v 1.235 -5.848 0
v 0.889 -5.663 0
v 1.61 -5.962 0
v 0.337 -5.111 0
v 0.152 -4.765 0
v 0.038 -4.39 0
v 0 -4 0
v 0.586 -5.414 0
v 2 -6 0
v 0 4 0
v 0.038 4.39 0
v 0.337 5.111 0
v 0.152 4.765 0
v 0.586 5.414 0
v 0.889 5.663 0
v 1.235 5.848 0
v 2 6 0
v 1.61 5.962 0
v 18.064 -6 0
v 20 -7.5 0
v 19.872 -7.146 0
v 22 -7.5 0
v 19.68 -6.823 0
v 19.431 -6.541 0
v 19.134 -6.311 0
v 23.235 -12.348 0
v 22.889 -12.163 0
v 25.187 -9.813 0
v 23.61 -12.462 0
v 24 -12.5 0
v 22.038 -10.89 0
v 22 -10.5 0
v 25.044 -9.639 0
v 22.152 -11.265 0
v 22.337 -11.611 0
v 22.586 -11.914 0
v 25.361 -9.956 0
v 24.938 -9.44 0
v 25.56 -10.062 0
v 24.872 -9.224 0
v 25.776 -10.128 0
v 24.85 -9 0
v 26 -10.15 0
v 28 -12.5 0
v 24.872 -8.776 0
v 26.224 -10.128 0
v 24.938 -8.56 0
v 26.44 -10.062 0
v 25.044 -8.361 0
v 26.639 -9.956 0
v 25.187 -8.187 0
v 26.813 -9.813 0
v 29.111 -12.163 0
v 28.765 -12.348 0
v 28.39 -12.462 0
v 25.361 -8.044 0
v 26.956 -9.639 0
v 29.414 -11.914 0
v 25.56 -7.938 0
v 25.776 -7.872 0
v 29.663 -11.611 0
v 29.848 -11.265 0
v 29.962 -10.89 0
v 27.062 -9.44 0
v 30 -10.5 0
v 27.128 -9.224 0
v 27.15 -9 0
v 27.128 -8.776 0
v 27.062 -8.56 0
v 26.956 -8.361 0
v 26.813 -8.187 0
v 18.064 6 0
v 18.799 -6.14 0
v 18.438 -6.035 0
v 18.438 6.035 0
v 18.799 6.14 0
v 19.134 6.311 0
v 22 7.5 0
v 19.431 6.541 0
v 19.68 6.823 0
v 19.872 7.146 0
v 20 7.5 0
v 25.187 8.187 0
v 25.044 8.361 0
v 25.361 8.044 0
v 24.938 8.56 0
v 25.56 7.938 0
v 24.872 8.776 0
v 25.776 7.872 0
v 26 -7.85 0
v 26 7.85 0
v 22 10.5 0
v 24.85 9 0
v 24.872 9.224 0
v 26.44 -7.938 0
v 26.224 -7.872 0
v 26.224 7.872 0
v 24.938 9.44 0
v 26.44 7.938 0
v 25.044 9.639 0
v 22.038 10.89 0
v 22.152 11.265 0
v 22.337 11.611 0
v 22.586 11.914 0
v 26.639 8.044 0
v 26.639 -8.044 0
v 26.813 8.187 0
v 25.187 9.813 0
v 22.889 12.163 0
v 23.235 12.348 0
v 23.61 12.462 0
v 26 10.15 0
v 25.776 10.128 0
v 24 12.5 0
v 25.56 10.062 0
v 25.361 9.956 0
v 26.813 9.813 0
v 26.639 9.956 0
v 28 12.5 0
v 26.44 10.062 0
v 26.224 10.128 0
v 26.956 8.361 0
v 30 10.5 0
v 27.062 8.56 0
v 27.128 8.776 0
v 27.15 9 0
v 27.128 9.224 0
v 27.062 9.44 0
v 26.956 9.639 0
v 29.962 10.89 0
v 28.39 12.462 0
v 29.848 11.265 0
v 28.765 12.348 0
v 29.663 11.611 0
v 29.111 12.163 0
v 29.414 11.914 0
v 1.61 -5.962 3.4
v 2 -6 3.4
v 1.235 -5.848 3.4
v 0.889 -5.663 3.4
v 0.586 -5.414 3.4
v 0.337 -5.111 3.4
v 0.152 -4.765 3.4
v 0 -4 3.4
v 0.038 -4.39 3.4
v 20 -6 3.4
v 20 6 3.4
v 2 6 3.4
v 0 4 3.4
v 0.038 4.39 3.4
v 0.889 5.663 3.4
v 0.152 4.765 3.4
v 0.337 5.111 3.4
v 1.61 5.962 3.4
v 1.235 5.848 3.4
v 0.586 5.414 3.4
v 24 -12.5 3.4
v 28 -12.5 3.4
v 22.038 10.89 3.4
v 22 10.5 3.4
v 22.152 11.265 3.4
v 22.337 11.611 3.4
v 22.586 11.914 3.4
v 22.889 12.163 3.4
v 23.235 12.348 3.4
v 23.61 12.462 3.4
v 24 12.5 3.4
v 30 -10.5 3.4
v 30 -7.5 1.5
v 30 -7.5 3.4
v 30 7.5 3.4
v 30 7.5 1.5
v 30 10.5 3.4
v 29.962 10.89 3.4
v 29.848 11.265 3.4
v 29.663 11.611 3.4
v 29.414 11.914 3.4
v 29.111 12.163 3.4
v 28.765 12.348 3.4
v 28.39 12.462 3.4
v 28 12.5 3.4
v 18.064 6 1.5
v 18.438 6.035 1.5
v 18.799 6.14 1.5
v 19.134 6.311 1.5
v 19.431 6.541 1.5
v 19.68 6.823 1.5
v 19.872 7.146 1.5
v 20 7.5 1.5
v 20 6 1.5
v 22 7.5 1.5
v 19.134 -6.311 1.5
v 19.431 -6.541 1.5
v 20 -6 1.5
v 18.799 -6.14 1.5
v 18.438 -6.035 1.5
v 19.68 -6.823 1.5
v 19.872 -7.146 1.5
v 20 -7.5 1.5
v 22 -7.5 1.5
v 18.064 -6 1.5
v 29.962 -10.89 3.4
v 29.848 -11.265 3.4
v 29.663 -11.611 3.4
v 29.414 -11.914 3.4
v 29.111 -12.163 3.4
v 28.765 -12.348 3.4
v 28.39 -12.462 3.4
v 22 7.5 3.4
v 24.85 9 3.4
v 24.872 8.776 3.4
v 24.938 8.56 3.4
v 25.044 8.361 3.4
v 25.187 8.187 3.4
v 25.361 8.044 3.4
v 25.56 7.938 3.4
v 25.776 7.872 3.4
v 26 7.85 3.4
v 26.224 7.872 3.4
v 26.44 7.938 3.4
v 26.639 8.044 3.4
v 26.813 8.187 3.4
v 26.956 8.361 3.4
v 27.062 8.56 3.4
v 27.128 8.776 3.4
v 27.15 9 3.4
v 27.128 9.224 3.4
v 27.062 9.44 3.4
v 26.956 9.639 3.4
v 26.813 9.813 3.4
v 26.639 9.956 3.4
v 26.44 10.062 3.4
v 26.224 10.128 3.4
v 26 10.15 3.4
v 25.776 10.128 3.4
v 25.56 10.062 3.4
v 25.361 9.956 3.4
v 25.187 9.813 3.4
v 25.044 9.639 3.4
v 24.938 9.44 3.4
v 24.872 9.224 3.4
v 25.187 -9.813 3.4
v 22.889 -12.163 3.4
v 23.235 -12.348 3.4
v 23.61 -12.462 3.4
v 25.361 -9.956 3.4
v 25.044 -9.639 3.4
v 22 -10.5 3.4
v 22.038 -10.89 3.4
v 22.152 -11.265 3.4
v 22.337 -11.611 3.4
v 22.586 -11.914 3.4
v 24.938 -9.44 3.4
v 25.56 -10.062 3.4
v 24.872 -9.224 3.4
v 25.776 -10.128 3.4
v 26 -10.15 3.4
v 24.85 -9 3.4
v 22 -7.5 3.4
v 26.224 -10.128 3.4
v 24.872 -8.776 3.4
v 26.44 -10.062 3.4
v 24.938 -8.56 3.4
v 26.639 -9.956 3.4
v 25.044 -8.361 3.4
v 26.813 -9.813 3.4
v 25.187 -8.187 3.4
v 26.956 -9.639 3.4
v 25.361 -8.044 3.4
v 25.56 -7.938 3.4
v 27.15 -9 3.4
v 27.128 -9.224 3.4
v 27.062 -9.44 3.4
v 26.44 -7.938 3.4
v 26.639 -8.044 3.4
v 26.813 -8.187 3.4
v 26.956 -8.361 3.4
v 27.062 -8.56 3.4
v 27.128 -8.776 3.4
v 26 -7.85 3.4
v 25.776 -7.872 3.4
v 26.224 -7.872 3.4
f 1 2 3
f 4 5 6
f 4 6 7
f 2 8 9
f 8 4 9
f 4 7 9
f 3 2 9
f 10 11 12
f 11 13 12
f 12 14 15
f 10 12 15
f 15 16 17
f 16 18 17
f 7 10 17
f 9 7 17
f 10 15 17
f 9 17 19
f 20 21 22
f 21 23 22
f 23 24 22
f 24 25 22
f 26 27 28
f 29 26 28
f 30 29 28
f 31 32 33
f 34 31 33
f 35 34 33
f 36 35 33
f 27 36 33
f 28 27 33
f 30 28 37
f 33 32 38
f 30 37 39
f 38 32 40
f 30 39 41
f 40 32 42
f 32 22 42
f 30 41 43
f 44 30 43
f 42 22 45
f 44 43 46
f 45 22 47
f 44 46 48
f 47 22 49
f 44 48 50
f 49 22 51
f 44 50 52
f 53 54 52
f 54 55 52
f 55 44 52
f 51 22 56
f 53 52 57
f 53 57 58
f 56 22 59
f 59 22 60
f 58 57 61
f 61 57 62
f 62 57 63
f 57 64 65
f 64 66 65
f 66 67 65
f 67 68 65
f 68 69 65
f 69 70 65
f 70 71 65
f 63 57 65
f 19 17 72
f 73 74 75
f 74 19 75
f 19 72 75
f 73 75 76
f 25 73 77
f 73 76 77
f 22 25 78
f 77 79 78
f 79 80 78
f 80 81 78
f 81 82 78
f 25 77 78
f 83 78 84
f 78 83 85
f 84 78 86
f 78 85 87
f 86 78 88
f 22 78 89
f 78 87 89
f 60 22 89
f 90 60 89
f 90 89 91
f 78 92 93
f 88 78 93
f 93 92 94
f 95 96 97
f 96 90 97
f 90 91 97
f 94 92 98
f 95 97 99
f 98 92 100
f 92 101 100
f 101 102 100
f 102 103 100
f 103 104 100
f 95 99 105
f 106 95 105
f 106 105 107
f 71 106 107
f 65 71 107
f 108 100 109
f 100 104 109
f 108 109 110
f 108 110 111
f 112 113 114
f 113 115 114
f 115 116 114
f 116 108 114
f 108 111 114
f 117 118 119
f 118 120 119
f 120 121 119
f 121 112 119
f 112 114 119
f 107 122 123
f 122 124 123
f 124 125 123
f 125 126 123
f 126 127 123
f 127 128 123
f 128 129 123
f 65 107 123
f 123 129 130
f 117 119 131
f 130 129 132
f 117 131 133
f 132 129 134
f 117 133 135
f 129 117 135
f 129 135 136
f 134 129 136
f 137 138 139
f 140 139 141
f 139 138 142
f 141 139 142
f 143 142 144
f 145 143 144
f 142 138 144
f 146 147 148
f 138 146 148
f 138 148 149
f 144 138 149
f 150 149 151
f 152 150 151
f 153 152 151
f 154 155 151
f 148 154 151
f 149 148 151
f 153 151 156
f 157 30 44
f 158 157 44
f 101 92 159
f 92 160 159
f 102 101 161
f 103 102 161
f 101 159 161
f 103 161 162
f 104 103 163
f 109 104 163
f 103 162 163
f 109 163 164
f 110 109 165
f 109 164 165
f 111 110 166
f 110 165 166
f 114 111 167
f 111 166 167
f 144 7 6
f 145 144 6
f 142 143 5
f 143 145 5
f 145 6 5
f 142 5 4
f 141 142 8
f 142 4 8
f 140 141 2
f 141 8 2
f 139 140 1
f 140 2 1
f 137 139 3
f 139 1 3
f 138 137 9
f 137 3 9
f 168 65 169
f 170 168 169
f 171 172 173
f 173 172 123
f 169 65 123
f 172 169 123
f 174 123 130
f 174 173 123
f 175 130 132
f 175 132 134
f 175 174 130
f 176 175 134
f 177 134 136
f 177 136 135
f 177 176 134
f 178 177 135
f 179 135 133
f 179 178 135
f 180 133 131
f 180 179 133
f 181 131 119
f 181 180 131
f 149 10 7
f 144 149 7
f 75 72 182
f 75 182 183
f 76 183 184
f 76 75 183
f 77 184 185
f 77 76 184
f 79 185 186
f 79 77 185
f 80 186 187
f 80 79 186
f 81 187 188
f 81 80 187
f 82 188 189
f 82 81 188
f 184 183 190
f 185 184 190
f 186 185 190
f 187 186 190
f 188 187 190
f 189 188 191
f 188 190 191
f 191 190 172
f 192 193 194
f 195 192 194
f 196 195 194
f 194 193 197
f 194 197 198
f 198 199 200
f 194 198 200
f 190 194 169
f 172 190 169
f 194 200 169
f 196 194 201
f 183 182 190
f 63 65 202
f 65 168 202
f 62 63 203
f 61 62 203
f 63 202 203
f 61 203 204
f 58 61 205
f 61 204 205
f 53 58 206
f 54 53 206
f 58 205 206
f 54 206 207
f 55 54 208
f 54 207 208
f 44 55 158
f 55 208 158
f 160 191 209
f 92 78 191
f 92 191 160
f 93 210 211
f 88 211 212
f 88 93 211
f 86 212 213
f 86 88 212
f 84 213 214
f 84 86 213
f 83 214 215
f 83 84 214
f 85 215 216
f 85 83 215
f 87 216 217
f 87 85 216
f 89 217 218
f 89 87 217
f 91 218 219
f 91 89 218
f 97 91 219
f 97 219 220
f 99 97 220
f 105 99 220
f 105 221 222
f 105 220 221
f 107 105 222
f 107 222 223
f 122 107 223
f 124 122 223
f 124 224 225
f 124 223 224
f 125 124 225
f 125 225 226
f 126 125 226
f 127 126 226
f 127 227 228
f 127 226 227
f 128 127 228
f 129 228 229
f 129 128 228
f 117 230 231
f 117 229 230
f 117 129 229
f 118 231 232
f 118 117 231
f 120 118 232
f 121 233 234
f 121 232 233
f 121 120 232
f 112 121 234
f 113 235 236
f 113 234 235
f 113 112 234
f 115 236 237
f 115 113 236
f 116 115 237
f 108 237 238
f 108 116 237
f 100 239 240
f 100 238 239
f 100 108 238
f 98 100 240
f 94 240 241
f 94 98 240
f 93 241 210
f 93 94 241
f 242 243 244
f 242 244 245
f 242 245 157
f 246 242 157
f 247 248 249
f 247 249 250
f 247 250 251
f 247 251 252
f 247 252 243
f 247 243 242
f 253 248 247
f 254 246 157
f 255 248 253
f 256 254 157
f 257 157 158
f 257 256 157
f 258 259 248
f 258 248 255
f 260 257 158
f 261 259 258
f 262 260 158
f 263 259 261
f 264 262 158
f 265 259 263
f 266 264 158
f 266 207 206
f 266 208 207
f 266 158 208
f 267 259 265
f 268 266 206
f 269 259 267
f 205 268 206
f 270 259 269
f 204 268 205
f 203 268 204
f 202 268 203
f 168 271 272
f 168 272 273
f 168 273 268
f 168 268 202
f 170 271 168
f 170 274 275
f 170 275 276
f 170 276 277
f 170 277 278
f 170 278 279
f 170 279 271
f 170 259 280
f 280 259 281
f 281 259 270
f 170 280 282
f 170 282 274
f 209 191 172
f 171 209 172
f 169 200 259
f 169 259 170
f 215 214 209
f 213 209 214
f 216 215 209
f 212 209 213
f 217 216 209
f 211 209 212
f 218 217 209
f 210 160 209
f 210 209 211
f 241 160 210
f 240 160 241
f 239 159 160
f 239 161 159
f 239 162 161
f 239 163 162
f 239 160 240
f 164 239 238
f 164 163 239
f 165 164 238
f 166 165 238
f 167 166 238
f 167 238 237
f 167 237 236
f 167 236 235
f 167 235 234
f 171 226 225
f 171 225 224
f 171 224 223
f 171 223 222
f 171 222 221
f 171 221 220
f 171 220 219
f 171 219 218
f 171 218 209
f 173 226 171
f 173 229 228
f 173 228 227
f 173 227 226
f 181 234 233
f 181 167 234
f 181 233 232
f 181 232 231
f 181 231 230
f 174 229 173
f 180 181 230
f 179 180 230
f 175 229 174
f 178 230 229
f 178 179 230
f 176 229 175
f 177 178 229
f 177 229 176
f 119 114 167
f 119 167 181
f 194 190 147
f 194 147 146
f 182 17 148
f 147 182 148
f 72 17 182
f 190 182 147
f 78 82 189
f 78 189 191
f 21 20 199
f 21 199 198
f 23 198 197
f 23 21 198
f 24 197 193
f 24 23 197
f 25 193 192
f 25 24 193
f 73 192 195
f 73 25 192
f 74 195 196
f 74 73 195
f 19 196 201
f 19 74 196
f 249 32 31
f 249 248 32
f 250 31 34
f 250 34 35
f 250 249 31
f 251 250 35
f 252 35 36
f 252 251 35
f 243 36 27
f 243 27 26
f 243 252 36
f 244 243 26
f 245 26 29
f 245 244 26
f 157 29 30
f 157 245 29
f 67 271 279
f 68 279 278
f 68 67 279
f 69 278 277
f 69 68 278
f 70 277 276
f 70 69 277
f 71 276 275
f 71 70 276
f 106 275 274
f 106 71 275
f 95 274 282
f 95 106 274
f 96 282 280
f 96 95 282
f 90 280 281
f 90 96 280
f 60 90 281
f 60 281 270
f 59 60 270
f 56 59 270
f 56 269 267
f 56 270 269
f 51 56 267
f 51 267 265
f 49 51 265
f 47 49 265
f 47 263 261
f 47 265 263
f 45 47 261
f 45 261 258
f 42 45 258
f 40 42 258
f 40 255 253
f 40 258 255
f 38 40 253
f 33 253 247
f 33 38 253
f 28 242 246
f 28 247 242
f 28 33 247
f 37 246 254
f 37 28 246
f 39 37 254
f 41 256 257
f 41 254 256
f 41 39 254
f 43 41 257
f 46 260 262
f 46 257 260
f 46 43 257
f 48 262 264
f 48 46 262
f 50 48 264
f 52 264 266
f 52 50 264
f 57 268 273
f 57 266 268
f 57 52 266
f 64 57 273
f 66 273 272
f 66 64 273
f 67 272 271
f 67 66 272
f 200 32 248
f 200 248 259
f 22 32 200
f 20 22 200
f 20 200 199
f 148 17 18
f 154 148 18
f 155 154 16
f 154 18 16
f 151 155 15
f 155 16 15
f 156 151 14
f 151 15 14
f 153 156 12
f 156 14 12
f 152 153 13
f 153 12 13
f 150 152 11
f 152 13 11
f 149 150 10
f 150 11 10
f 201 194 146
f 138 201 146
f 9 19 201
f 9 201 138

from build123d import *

# Parameters (mm, degrees)
DODANIE_WYCI_GNI_CIE1_DEPTH = 3.4
DODANIE_WYCI_GNI_CIE2_DEPTH = 1.5
ZAOKR_GLENIE1_R             = 2
SZKIC4_W                    = 8
SZKIC4_H                    = 5
DODANIE_WYCI_GNI_CIE3_DEPTH = 3.4
ZAOKR_GLENIE2_R             = 2
SZKIC6_R                    = 1.15
WYTNIJ_WYCI_GNI_CIE1_DEPTH  = 3.5


with BuildPart() as part:
    # Szkic1 → Dodanie-wyciągnięcie1 (new body)
    with BuildSketch(Plane.XY):
        Polygon((0, 0), (0, 6), (20, 6), (20, -6), (0, -6), align=None)
    extrude(amount=DODANIE_WYCI_GNI_CIE1_DEPTH)

    # Szkic3 → Dodanie-wyciągnięcie2 (add)
    with BuildSketch(Plane.XY):
        Polygon((20, 6), (20, 7.5), (30, 7.5), (30, -7.5), (20, -7.5), (20, -6), align=None)
    extrude(amount=DODANIE_WYCI_GNI_CIE2_DEPTH)

    # Zaokrąglenie1
    # the kernel refuses this fillet: 2 mm, written as the material it adds along each edge
    with BuildSketch(Plane(origin=(20, -6, 0), x_dir=(-1, 0, 0), z_dir=(0, 0, 1))) as zaokr_glenie1_piece_1:
        with BuildLine():
            CenterArc((1.936491673, 2), ZAOKR_GLENIE1_R, 194.477512186, 75.522487814)
            Line((0, 1.5), (0, 0))
            Line((0, 0), (1.936491673, 0))
        make_face()
    extrude(amount=1.5)
    with BuildSketch(Plane(origin=(20, 6, 0), x_dir=(-1, 0, 0), z_dir=(0, 0, 1))) as zaokr_glenie1_piece_2:
        with BuildLine():
            CenterArc((1.936491673, -2), ZAOKR_GLENIE1_R, 90, 75.522487814)
            Line((0, -1.5), (0, 0))
            Line((0, 0), (1.936491673, 0))
        make_face()
    extrude(amount=1.5)
    # the kernel refuses this fillet: 2 mm, written as the material it takes off along each edge
    with BuildSketch(Plane(origin=(0, -6, -5), x_dir=(0, 1, 0), z_dir=(0, 0, 1))) as zaokr_glenie1_2_piece_1:
        with BuildLine():
            CenterArc((ZAOKR_GLENIE1_R, -ZAOKR_GLENIE1_R), ZAOKR_GLENIE1_R, 90, 90)
            Line((0, -ZAOKR_GLENIE1_R), (0, 0))
            Line((0, 0), (ZAOKR_GLENIE1_R, 0))
        make_face()
    extrude(amount=13.4, mode=Mode.SUBTRACT)
    with BuildSketch(Plane(origin=(0, 6, -5), x_dir=(0, -1, 0), z_dir=(0, 0, 1))) as zaokr_glenie1_2_piece_2:
        with BuildLine():
            CenterArc((ZAOKR_GLENIE1_R, ZAOKR_GLENIE1_R), ZAOKR_GLENIE1_R, 180, 90)
            Line((0, ZAOKR_GLENIE1_R), (0, 0))
            Line((0, 0), (ZAOKR_GLENIE1_R, 0))
        make_face()
    extrude(amount=13.4, mode=Mode.SUBTRACT)

    # Szkic4 → Dodanie-wyciągnięcie3 (add)
    with BuildSketch(Plane.XY):
        with Locations((26, 10)):
            Rectangle(SZKIC4_W, SZKIC4_H)
        with Locations((26, -10)):
            Rectangle(SZKIC4_W, SZKIC4_H)
    extrude(amount=DODANIE_WYCI_GNI_CIE3_DEPTH)

    # Zaokrąglenie2
    zaokr_glenie2_edges = [part.edges().sort_by_distance(p)[0] for p in [
        (30, 12.5, 1.7),
        (22, 12.5, 1.7),
        (22, -12.5, 1.7),
        (30, -12.5, 1.7),
    ]]
    fillet(zaokr_glenie2_edges, radius=ZAOKR_GLENIE2_R)

    # Szkic6 → Wytnij-wyciągnięcie1 (cut)
    with BuildSketch(Plane.XY):
        with Locations(Location((26, 9, 0), (0, 0, 180))):
            Circle(SZKIC6_R)
        with Locations((26, -9)):
            Circle(SZKIC6_R)
    extrude(amount=WYTNIJ_WYCI_GNI_CIE1_DEPTH, mode=Mode.SUBTRACT)


solid = part.part
